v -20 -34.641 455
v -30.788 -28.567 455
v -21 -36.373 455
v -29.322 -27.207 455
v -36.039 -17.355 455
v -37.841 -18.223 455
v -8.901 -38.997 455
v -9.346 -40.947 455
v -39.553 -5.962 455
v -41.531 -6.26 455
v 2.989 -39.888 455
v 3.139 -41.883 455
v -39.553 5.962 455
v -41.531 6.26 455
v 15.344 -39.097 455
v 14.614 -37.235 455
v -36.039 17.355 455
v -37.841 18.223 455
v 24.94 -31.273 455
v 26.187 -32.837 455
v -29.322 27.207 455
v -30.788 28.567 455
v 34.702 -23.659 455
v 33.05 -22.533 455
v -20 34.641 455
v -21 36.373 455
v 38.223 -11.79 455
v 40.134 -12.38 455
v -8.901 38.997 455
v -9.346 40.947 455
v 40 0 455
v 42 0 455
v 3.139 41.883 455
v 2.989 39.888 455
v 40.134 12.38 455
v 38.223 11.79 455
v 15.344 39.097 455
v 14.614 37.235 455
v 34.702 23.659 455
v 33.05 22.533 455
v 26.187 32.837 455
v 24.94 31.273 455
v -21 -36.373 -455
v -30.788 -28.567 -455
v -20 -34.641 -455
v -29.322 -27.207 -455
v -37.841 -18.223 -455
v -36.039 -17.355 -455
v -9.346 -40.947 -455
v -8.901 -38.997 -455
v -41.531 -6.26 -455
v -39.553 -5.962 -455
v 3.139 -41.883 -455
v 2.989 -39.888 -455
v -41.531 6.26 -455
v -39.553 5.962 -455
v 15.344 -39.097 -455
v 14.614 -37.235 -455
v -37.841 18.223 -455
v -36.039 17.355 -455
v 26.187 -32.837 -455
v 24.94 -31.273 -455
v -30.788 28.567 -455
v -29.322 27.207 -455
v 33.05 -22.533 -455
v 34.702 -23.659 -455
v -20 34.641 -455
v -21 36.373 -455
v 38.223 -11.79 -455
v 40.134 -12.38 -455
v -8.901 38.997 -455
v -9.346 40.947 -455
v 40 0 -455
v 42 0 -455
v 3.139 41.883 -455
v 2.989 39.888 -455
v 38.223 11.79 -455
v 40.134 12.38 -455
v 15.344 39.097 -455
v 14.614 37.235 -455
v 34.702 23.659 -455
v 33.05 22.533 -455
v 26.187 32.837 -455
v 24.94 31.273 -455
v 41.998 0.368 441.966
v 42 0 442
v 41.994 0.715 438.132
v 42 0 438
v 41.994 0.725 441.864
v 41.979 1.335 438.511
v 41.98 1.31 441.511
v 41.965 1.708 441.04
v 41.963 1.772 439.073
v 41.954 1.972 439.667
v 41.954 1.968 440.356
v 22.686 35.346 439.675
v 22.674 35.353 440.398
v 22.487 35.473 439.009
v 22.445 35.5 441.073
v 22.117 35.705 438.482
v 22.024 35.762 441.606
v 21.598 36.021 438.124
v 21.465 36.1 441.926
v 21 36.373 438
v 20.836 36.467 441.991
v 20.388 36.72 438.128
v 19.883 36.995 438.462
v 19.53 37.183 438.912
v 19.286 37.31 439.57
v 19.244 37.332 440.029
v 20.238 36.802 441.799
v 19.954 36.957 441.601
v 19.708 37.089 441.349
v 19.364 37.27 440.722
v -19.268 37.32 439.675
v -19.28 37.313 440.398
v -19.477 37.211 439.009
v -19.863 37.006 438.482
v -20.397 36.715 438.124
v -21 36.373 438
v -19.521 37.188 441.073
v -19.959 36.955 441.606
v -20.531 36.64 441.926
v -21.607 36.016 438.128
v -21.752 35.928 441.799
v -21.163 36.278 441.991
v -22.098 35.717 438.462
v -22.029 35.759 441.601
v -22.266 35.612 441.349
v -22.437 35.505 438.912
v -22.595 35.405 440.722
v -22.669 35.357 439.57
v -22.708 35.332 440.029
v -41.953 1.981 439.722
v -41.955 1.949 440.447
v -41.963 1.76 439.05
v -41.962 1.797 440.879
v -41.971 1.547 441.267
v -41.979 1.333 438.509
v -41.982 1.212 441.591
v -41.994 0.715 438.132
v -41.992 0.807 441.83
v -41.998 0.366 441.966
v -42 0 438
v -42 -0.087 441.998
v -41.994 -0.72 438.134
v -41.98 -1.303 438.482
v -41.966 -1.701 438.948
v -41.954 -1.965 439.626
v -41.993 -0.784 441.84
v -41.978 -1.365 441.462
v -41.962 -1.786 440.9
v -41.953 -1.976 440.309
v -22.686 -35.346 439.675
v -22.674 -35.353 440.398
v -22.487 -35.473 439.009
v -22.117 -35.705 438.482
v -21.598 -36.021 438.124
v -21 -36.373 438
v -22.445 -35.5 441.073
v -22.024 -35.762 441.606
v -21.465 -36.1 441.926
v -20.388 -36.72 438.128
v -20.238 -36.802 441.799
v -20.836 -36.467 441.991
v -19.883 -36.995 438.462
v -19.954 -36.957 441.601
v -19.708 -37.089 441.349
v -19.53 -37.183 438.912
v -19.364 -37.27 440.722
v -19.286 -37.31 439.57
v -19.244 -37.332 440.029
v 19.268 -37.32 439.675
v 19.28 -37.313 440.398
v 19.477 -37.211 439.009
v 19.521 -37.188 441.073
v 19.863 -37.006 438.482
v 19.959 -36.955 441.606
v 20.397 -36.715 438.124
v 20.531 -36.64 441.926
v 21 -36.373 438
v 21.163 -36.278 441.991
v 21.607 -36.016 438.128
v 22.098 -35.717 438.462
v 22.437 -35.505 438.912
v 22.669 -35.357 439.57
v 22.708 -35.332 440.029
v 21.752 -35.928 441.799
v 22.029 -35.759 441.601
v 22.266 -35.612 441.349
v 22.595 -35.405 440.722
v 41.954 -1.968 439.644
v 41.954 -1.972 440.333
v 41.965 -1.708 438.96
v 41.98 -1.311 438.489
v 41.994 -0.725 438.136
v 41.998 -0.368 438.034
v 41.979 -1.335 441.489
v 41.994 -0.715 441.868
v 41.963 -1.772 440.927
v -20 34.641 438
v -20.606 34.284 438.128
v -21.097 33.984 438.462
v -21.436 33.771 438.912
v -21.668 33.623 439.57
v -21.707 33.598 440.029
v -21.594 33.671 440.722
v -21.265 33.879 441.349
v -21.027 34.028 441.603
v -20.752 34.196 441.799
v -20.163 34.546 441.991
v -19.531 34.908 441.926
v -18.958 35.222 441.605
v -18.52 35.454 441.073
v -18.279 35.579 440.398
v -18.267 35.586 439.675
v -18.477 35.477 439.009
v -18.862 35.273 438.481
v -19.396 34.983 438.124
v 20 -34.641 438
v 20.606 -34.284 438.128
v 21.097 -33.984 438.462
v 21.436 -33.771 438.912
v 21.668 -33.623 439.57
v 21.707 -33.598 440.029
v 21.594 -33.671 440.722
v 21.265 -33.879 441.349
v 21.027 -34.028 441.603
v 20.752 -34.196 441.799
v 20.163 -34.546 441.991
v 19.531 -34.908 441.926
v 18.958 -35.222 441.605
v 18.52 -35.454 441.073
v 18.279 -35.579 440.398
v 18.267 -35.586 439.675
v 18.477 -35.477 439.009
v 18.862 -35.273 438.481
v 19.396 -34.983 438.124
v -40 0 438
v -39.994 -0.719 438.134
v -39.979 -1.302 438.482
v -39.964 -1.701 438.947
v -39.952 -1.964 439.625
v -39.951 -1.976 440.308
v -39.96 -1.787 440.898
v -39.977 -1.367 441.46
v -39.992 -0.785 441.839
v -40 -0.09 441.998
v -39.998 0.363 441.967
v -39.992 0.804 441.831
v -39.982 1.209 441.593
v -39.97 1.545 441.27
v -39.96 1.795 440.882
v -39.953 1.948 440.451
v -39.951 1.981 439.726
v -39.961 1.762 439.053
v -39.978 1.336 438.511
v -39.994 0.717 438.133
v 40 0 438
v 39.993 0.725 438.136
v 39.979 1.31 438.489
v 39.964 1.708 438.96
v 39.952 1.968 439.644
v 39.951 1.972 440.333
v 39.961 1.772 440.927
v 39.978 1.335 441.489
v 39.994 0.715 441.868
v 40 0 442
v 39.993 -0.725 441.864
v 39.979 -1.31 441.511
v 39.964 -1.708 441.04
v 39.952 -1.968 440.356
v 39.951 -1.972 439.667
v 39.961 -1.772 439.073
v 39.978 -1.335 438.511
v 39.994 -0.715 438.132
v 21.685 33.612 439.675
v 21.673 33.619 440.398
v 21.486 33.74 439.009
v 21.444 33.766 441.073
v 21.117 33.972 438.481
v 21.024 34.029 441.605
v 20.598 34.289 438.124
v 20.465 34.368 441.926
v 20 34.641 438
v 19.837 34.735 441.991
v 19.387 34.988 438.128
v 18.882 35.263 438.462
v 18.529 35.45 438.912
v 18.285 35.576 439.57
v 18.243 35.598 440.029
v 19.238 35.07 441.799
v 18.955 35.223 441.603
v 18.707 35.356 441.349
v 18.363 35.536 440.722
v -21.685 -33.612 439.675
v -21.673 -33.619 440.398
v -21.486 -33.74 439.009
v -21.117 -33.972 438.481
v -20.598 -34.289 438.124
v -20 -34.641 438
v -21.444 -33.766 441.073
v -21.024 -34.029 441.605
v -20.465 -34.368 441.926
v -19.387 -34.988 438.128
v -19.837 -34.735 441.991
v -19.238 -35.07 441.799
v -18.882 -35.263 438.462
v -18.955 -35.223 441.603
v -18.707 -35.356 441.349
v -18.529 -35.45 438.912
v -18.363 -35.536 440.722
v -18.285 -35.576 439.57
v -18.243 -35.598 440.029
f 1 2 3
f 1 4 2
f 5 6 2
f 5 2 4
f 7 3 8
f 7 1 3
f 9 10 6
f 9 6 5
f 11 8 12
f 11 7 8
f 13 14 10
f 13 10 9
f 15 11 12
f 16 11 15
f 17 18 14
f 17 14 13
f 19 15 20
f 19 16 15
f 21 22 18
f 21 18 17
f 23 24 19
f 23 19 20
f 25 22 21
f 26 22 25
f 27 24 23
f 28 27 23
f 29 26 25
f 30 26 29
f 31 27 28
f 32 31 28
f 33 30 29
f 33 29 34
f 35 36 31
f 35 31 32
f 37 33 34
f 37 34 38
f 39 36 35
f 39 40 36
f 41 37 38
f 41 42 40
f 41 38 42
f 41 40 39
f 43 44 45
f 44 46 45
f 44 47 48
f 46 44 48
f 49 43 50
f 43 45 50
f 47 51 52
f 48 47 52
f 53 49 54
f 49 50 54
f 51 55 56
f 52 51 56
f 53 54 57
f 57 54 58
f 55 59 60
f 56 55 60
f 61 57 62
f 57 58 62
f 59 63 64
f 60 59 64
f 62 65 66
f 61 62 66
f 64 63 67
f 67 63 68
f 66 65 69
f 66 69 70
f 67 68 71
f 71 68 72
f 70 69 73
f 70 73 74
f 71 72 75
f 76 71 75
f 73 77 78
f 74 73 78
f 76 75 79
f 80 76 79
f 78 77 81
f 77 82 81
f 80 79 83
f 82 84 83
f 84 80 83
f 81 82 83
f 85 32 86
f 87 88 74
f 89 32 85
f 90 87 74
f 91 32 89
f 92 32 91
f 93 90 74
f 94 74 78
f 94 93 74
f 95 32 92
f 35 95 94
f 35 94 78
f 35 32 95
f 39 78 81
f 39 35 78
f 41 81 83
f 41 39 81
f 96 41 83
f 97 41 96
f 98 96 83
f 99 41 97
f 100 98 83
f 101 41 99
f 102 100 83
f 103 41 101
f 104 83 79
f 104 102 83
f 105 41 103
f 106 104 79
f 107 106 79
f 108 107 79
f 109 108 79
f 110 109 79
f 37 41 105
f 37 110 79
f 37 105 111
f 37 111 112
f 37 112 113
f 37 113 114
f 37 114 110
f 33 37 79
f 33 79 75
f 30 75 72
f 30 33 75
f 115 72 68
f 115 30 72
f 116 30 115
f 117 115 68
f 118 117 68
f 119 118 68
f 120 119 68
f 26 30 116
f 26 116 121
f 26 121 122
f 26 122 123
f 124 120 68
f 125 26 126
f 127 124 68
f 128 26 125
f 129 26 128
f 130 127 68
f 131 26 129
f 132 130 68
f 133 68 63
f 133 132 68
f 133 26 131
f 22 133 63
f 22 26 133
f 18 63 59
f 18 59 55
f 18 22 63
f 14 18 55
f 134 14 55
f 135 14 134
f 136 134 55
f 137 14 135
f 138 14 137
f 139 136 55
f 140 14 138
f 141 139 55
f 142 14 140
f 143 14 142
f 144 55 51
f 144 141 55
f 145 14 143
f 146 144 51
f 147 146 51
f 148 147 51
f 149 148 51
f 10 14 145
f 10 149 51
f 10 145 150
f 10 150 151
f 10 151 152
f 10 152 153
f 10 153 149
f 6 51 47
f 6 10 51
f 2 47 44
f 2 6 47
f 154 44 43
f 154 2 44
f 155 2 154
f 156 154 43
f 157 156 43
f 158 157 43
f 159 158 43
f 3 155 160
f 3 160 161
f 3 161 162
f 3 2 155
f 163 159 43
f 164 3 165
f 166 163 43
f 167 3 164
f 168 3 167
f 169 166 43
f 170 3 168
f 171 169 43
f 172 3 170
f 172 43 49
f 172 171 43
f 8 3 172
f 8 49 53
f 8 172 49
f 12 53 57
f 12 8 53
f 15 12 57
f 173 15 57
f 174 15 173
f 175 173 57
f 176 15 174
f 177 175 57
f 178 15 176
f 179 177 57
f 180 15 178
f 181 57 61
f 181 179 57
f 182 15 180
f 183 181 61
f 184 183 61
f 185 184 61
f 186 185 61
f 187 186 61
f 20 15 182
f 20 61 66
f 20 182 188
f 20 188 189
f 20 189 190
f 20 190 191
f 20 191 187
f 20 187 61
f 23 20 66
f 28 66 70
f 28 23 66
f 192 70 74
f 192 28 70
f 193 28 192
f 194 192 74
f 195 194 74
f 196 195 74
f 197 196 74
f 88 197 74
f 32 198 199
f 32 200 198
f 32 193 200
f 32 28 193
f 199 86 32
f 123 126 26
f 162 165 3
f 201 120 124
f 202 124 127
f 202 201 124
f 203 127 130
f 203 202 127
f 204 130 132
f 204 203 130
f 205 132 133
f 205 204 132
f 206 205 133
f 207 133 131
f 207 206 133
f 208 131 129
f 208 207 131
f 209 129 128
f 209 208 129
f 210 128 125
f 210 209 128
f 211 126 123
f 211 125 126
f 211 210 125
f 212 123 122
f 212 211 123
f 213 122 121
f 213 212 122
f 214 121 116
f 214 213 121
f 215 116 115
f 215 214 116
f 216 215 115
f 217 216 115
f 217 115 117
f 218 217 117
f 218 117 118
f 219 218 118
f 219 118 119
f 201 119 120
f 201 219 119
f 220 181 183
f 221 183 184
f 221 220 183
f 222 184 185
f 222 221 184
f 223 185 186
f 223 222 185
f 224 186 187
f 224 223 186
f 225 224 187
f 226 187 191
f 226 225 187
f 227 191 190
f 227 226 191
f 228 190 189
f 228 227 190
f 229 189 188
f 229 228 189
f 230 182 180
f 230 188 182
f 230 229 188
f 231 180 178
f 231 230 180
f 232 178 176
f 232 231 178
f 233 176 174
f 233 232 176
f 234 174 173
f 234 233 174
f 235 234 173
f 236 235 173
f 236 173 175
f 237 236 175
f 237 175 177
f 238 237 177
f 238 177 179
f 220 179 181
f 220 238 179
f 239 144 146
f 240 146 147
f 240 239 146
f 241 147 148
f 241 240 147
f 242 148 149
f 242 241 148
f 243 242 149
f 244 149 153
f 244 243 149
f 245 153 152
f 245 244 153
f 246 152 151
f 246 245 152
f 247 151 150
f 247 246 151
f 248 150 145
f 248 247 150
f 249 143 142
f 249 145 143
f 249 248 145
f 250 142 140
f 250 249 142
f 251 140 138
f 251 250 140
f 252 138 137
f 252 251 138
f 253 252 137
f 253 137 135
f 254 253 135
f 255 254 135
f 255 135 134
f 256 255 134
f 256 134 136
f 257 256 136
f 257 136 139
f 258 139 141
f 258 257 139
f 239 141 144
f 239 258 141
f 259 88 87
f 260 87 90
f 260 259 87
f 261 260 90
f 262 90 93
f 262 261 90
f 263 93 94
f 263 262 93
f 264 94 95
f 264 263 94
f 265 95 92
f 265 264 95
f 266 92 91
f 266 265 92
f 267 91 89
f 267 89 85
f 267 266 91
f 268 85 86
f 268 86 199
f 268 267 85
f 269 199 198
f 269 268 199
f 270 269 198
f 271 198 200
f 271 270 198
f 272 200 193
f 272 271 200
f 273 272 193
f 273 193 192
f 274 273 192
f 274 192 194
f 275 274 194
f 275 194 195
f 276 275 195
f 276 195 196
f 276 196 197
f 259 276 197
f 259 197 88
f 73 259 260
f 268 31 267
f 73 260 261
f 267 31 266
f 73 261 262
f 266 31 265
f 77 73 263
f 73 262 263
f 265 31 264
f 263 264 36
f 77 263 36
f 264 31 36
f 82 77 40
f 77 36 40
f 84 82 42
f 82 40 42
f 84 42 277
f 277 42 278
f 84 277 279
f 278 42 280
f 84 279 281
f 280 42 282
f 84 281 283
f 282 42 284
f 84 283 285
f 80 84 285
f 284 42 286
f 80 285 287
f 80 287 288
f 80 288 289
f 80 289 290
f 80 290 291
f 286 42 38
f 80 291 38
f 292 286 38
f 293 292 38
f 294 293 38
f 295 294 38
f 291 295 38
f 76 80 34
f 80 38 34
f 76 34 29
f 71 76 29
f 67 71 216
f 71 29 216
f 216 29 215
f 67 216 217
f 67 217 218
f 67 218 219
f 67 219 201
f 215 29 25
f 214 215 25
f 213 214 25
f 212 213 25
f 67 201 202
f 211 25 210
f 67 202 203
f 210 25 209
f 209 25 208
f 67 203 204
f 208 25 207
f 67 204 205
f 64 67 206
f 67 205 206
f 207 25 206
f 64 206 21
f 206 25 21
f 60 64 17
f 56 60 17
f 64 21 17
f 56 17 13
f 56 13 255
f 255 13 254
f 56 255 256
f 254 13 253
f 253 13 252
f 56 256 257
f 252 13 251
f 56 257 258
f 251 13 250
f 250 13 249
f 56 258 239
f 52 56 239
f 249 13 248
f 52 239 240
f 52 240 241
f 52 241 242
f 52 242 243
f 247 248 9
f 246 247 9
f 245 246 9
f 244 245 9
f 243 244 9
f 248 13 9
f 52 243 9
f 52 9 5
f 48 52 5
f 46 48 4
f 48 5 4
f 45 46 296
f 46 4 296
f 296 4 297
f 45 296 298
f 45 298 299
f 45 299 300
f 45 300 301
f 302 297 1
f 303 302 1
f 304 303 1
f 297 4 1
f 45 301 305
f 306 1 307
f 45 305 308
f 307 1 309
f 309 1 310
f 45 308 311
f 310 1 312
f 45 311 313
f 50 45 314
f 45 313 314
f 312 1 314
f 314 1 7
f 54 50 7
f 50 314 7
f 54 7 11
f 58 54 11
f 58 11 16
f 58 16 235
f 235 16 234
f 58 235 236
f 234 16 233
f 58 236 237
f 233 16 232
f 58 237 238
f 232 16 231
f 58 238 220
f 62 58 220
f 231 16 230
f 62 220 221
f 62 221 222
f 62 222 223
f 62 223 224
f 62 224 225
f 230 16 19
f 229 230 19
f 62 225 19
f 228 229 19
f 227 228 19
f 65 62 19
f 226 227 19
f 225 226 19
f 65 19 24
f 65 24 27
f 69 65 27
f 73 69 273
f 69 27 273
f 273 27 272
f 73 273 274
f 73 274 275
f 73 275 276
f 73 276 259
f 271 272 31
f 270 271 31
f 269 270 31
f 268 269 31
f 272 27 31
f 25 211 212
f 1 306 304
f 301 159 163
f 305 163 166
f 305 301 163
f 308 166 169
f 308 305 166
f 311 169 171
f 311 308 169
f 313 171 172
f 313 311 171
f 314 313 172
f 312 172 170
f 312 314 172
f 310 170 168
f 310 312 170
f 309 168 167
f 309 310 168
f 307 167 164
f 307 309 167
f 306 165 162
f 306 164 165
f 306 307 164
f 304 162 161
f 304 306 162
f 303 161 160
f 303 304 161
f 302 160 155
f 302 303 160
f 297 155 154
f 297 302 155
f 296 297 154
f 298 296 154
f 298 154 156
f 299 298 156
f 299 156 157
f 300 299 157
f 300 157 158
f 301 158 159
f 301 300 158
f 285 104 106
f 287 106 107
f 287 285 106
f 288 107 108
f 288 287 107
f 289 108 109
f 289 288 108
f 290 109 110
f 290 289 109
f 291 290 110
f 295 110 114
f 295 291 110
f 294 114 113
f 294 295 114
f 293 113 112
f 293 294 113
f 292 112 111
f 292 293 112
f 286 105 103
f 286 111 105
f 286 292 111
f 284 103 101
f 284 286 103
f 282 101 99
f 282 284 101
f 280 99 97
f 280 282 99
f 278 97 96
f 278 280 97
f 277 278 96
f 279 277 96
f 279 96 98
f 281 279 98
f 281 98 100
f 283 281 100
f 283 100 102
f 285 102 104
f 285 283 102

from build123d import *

# Parameters (mm, degrees)
SKETCH3_R           = 42
SKETCH3_R_2         = 40
BOSS_EXTRUDE1_DEPTH = 910
CUT_EXTRUDE1_START  = -2.050031
SKETCH4_R           = 2
CUT_EXTRUDE1_DEPTH  = 2.050031
CIRPATTERN1_COUNT   = 6


with BuildPart() as part:
    # Sketch3 → Boss-Extrude1 (new body)
    with BuildSketch(Plane.XY.offset(455)):
        Circle(SKETCH3_R)
        Circle(SKETCH3_R_2, mode=Mode.SUBTRACT)
    extrude(amount=-BOSS_EXTRUDE1_DEPTH)

    # Sketch4 → Cut-Extrude1 (cut)
    with BuildSketch(Plane(origin=(42, 0, 0), x_dir=(0, 0, -1), z_dir=(1, 0, 0)).offset(CUT_EXTRUDE1_START)):
        with Locations((-440, 0)):
            Circle(SKETCH4_R)
    cut_extrude1 = extrude(amount=CUT_EXTRUDE1_DEPTH, mode=Mode.SUBTRACT)

    # CirPattern1: Cut-Extrude1 ×6 about axis
    cirpattern1_axis = Axis((0, 0, 455), (0, 0, 1))
    for i in range(1, CIRPATTERN1_COUNT):
        add(cut_extrude1.rotate(cirpattern1_axis, i * 360 / CIRPATTERN1_COUNT), mode=Mode.SUBTRACT)


solid = part.part
